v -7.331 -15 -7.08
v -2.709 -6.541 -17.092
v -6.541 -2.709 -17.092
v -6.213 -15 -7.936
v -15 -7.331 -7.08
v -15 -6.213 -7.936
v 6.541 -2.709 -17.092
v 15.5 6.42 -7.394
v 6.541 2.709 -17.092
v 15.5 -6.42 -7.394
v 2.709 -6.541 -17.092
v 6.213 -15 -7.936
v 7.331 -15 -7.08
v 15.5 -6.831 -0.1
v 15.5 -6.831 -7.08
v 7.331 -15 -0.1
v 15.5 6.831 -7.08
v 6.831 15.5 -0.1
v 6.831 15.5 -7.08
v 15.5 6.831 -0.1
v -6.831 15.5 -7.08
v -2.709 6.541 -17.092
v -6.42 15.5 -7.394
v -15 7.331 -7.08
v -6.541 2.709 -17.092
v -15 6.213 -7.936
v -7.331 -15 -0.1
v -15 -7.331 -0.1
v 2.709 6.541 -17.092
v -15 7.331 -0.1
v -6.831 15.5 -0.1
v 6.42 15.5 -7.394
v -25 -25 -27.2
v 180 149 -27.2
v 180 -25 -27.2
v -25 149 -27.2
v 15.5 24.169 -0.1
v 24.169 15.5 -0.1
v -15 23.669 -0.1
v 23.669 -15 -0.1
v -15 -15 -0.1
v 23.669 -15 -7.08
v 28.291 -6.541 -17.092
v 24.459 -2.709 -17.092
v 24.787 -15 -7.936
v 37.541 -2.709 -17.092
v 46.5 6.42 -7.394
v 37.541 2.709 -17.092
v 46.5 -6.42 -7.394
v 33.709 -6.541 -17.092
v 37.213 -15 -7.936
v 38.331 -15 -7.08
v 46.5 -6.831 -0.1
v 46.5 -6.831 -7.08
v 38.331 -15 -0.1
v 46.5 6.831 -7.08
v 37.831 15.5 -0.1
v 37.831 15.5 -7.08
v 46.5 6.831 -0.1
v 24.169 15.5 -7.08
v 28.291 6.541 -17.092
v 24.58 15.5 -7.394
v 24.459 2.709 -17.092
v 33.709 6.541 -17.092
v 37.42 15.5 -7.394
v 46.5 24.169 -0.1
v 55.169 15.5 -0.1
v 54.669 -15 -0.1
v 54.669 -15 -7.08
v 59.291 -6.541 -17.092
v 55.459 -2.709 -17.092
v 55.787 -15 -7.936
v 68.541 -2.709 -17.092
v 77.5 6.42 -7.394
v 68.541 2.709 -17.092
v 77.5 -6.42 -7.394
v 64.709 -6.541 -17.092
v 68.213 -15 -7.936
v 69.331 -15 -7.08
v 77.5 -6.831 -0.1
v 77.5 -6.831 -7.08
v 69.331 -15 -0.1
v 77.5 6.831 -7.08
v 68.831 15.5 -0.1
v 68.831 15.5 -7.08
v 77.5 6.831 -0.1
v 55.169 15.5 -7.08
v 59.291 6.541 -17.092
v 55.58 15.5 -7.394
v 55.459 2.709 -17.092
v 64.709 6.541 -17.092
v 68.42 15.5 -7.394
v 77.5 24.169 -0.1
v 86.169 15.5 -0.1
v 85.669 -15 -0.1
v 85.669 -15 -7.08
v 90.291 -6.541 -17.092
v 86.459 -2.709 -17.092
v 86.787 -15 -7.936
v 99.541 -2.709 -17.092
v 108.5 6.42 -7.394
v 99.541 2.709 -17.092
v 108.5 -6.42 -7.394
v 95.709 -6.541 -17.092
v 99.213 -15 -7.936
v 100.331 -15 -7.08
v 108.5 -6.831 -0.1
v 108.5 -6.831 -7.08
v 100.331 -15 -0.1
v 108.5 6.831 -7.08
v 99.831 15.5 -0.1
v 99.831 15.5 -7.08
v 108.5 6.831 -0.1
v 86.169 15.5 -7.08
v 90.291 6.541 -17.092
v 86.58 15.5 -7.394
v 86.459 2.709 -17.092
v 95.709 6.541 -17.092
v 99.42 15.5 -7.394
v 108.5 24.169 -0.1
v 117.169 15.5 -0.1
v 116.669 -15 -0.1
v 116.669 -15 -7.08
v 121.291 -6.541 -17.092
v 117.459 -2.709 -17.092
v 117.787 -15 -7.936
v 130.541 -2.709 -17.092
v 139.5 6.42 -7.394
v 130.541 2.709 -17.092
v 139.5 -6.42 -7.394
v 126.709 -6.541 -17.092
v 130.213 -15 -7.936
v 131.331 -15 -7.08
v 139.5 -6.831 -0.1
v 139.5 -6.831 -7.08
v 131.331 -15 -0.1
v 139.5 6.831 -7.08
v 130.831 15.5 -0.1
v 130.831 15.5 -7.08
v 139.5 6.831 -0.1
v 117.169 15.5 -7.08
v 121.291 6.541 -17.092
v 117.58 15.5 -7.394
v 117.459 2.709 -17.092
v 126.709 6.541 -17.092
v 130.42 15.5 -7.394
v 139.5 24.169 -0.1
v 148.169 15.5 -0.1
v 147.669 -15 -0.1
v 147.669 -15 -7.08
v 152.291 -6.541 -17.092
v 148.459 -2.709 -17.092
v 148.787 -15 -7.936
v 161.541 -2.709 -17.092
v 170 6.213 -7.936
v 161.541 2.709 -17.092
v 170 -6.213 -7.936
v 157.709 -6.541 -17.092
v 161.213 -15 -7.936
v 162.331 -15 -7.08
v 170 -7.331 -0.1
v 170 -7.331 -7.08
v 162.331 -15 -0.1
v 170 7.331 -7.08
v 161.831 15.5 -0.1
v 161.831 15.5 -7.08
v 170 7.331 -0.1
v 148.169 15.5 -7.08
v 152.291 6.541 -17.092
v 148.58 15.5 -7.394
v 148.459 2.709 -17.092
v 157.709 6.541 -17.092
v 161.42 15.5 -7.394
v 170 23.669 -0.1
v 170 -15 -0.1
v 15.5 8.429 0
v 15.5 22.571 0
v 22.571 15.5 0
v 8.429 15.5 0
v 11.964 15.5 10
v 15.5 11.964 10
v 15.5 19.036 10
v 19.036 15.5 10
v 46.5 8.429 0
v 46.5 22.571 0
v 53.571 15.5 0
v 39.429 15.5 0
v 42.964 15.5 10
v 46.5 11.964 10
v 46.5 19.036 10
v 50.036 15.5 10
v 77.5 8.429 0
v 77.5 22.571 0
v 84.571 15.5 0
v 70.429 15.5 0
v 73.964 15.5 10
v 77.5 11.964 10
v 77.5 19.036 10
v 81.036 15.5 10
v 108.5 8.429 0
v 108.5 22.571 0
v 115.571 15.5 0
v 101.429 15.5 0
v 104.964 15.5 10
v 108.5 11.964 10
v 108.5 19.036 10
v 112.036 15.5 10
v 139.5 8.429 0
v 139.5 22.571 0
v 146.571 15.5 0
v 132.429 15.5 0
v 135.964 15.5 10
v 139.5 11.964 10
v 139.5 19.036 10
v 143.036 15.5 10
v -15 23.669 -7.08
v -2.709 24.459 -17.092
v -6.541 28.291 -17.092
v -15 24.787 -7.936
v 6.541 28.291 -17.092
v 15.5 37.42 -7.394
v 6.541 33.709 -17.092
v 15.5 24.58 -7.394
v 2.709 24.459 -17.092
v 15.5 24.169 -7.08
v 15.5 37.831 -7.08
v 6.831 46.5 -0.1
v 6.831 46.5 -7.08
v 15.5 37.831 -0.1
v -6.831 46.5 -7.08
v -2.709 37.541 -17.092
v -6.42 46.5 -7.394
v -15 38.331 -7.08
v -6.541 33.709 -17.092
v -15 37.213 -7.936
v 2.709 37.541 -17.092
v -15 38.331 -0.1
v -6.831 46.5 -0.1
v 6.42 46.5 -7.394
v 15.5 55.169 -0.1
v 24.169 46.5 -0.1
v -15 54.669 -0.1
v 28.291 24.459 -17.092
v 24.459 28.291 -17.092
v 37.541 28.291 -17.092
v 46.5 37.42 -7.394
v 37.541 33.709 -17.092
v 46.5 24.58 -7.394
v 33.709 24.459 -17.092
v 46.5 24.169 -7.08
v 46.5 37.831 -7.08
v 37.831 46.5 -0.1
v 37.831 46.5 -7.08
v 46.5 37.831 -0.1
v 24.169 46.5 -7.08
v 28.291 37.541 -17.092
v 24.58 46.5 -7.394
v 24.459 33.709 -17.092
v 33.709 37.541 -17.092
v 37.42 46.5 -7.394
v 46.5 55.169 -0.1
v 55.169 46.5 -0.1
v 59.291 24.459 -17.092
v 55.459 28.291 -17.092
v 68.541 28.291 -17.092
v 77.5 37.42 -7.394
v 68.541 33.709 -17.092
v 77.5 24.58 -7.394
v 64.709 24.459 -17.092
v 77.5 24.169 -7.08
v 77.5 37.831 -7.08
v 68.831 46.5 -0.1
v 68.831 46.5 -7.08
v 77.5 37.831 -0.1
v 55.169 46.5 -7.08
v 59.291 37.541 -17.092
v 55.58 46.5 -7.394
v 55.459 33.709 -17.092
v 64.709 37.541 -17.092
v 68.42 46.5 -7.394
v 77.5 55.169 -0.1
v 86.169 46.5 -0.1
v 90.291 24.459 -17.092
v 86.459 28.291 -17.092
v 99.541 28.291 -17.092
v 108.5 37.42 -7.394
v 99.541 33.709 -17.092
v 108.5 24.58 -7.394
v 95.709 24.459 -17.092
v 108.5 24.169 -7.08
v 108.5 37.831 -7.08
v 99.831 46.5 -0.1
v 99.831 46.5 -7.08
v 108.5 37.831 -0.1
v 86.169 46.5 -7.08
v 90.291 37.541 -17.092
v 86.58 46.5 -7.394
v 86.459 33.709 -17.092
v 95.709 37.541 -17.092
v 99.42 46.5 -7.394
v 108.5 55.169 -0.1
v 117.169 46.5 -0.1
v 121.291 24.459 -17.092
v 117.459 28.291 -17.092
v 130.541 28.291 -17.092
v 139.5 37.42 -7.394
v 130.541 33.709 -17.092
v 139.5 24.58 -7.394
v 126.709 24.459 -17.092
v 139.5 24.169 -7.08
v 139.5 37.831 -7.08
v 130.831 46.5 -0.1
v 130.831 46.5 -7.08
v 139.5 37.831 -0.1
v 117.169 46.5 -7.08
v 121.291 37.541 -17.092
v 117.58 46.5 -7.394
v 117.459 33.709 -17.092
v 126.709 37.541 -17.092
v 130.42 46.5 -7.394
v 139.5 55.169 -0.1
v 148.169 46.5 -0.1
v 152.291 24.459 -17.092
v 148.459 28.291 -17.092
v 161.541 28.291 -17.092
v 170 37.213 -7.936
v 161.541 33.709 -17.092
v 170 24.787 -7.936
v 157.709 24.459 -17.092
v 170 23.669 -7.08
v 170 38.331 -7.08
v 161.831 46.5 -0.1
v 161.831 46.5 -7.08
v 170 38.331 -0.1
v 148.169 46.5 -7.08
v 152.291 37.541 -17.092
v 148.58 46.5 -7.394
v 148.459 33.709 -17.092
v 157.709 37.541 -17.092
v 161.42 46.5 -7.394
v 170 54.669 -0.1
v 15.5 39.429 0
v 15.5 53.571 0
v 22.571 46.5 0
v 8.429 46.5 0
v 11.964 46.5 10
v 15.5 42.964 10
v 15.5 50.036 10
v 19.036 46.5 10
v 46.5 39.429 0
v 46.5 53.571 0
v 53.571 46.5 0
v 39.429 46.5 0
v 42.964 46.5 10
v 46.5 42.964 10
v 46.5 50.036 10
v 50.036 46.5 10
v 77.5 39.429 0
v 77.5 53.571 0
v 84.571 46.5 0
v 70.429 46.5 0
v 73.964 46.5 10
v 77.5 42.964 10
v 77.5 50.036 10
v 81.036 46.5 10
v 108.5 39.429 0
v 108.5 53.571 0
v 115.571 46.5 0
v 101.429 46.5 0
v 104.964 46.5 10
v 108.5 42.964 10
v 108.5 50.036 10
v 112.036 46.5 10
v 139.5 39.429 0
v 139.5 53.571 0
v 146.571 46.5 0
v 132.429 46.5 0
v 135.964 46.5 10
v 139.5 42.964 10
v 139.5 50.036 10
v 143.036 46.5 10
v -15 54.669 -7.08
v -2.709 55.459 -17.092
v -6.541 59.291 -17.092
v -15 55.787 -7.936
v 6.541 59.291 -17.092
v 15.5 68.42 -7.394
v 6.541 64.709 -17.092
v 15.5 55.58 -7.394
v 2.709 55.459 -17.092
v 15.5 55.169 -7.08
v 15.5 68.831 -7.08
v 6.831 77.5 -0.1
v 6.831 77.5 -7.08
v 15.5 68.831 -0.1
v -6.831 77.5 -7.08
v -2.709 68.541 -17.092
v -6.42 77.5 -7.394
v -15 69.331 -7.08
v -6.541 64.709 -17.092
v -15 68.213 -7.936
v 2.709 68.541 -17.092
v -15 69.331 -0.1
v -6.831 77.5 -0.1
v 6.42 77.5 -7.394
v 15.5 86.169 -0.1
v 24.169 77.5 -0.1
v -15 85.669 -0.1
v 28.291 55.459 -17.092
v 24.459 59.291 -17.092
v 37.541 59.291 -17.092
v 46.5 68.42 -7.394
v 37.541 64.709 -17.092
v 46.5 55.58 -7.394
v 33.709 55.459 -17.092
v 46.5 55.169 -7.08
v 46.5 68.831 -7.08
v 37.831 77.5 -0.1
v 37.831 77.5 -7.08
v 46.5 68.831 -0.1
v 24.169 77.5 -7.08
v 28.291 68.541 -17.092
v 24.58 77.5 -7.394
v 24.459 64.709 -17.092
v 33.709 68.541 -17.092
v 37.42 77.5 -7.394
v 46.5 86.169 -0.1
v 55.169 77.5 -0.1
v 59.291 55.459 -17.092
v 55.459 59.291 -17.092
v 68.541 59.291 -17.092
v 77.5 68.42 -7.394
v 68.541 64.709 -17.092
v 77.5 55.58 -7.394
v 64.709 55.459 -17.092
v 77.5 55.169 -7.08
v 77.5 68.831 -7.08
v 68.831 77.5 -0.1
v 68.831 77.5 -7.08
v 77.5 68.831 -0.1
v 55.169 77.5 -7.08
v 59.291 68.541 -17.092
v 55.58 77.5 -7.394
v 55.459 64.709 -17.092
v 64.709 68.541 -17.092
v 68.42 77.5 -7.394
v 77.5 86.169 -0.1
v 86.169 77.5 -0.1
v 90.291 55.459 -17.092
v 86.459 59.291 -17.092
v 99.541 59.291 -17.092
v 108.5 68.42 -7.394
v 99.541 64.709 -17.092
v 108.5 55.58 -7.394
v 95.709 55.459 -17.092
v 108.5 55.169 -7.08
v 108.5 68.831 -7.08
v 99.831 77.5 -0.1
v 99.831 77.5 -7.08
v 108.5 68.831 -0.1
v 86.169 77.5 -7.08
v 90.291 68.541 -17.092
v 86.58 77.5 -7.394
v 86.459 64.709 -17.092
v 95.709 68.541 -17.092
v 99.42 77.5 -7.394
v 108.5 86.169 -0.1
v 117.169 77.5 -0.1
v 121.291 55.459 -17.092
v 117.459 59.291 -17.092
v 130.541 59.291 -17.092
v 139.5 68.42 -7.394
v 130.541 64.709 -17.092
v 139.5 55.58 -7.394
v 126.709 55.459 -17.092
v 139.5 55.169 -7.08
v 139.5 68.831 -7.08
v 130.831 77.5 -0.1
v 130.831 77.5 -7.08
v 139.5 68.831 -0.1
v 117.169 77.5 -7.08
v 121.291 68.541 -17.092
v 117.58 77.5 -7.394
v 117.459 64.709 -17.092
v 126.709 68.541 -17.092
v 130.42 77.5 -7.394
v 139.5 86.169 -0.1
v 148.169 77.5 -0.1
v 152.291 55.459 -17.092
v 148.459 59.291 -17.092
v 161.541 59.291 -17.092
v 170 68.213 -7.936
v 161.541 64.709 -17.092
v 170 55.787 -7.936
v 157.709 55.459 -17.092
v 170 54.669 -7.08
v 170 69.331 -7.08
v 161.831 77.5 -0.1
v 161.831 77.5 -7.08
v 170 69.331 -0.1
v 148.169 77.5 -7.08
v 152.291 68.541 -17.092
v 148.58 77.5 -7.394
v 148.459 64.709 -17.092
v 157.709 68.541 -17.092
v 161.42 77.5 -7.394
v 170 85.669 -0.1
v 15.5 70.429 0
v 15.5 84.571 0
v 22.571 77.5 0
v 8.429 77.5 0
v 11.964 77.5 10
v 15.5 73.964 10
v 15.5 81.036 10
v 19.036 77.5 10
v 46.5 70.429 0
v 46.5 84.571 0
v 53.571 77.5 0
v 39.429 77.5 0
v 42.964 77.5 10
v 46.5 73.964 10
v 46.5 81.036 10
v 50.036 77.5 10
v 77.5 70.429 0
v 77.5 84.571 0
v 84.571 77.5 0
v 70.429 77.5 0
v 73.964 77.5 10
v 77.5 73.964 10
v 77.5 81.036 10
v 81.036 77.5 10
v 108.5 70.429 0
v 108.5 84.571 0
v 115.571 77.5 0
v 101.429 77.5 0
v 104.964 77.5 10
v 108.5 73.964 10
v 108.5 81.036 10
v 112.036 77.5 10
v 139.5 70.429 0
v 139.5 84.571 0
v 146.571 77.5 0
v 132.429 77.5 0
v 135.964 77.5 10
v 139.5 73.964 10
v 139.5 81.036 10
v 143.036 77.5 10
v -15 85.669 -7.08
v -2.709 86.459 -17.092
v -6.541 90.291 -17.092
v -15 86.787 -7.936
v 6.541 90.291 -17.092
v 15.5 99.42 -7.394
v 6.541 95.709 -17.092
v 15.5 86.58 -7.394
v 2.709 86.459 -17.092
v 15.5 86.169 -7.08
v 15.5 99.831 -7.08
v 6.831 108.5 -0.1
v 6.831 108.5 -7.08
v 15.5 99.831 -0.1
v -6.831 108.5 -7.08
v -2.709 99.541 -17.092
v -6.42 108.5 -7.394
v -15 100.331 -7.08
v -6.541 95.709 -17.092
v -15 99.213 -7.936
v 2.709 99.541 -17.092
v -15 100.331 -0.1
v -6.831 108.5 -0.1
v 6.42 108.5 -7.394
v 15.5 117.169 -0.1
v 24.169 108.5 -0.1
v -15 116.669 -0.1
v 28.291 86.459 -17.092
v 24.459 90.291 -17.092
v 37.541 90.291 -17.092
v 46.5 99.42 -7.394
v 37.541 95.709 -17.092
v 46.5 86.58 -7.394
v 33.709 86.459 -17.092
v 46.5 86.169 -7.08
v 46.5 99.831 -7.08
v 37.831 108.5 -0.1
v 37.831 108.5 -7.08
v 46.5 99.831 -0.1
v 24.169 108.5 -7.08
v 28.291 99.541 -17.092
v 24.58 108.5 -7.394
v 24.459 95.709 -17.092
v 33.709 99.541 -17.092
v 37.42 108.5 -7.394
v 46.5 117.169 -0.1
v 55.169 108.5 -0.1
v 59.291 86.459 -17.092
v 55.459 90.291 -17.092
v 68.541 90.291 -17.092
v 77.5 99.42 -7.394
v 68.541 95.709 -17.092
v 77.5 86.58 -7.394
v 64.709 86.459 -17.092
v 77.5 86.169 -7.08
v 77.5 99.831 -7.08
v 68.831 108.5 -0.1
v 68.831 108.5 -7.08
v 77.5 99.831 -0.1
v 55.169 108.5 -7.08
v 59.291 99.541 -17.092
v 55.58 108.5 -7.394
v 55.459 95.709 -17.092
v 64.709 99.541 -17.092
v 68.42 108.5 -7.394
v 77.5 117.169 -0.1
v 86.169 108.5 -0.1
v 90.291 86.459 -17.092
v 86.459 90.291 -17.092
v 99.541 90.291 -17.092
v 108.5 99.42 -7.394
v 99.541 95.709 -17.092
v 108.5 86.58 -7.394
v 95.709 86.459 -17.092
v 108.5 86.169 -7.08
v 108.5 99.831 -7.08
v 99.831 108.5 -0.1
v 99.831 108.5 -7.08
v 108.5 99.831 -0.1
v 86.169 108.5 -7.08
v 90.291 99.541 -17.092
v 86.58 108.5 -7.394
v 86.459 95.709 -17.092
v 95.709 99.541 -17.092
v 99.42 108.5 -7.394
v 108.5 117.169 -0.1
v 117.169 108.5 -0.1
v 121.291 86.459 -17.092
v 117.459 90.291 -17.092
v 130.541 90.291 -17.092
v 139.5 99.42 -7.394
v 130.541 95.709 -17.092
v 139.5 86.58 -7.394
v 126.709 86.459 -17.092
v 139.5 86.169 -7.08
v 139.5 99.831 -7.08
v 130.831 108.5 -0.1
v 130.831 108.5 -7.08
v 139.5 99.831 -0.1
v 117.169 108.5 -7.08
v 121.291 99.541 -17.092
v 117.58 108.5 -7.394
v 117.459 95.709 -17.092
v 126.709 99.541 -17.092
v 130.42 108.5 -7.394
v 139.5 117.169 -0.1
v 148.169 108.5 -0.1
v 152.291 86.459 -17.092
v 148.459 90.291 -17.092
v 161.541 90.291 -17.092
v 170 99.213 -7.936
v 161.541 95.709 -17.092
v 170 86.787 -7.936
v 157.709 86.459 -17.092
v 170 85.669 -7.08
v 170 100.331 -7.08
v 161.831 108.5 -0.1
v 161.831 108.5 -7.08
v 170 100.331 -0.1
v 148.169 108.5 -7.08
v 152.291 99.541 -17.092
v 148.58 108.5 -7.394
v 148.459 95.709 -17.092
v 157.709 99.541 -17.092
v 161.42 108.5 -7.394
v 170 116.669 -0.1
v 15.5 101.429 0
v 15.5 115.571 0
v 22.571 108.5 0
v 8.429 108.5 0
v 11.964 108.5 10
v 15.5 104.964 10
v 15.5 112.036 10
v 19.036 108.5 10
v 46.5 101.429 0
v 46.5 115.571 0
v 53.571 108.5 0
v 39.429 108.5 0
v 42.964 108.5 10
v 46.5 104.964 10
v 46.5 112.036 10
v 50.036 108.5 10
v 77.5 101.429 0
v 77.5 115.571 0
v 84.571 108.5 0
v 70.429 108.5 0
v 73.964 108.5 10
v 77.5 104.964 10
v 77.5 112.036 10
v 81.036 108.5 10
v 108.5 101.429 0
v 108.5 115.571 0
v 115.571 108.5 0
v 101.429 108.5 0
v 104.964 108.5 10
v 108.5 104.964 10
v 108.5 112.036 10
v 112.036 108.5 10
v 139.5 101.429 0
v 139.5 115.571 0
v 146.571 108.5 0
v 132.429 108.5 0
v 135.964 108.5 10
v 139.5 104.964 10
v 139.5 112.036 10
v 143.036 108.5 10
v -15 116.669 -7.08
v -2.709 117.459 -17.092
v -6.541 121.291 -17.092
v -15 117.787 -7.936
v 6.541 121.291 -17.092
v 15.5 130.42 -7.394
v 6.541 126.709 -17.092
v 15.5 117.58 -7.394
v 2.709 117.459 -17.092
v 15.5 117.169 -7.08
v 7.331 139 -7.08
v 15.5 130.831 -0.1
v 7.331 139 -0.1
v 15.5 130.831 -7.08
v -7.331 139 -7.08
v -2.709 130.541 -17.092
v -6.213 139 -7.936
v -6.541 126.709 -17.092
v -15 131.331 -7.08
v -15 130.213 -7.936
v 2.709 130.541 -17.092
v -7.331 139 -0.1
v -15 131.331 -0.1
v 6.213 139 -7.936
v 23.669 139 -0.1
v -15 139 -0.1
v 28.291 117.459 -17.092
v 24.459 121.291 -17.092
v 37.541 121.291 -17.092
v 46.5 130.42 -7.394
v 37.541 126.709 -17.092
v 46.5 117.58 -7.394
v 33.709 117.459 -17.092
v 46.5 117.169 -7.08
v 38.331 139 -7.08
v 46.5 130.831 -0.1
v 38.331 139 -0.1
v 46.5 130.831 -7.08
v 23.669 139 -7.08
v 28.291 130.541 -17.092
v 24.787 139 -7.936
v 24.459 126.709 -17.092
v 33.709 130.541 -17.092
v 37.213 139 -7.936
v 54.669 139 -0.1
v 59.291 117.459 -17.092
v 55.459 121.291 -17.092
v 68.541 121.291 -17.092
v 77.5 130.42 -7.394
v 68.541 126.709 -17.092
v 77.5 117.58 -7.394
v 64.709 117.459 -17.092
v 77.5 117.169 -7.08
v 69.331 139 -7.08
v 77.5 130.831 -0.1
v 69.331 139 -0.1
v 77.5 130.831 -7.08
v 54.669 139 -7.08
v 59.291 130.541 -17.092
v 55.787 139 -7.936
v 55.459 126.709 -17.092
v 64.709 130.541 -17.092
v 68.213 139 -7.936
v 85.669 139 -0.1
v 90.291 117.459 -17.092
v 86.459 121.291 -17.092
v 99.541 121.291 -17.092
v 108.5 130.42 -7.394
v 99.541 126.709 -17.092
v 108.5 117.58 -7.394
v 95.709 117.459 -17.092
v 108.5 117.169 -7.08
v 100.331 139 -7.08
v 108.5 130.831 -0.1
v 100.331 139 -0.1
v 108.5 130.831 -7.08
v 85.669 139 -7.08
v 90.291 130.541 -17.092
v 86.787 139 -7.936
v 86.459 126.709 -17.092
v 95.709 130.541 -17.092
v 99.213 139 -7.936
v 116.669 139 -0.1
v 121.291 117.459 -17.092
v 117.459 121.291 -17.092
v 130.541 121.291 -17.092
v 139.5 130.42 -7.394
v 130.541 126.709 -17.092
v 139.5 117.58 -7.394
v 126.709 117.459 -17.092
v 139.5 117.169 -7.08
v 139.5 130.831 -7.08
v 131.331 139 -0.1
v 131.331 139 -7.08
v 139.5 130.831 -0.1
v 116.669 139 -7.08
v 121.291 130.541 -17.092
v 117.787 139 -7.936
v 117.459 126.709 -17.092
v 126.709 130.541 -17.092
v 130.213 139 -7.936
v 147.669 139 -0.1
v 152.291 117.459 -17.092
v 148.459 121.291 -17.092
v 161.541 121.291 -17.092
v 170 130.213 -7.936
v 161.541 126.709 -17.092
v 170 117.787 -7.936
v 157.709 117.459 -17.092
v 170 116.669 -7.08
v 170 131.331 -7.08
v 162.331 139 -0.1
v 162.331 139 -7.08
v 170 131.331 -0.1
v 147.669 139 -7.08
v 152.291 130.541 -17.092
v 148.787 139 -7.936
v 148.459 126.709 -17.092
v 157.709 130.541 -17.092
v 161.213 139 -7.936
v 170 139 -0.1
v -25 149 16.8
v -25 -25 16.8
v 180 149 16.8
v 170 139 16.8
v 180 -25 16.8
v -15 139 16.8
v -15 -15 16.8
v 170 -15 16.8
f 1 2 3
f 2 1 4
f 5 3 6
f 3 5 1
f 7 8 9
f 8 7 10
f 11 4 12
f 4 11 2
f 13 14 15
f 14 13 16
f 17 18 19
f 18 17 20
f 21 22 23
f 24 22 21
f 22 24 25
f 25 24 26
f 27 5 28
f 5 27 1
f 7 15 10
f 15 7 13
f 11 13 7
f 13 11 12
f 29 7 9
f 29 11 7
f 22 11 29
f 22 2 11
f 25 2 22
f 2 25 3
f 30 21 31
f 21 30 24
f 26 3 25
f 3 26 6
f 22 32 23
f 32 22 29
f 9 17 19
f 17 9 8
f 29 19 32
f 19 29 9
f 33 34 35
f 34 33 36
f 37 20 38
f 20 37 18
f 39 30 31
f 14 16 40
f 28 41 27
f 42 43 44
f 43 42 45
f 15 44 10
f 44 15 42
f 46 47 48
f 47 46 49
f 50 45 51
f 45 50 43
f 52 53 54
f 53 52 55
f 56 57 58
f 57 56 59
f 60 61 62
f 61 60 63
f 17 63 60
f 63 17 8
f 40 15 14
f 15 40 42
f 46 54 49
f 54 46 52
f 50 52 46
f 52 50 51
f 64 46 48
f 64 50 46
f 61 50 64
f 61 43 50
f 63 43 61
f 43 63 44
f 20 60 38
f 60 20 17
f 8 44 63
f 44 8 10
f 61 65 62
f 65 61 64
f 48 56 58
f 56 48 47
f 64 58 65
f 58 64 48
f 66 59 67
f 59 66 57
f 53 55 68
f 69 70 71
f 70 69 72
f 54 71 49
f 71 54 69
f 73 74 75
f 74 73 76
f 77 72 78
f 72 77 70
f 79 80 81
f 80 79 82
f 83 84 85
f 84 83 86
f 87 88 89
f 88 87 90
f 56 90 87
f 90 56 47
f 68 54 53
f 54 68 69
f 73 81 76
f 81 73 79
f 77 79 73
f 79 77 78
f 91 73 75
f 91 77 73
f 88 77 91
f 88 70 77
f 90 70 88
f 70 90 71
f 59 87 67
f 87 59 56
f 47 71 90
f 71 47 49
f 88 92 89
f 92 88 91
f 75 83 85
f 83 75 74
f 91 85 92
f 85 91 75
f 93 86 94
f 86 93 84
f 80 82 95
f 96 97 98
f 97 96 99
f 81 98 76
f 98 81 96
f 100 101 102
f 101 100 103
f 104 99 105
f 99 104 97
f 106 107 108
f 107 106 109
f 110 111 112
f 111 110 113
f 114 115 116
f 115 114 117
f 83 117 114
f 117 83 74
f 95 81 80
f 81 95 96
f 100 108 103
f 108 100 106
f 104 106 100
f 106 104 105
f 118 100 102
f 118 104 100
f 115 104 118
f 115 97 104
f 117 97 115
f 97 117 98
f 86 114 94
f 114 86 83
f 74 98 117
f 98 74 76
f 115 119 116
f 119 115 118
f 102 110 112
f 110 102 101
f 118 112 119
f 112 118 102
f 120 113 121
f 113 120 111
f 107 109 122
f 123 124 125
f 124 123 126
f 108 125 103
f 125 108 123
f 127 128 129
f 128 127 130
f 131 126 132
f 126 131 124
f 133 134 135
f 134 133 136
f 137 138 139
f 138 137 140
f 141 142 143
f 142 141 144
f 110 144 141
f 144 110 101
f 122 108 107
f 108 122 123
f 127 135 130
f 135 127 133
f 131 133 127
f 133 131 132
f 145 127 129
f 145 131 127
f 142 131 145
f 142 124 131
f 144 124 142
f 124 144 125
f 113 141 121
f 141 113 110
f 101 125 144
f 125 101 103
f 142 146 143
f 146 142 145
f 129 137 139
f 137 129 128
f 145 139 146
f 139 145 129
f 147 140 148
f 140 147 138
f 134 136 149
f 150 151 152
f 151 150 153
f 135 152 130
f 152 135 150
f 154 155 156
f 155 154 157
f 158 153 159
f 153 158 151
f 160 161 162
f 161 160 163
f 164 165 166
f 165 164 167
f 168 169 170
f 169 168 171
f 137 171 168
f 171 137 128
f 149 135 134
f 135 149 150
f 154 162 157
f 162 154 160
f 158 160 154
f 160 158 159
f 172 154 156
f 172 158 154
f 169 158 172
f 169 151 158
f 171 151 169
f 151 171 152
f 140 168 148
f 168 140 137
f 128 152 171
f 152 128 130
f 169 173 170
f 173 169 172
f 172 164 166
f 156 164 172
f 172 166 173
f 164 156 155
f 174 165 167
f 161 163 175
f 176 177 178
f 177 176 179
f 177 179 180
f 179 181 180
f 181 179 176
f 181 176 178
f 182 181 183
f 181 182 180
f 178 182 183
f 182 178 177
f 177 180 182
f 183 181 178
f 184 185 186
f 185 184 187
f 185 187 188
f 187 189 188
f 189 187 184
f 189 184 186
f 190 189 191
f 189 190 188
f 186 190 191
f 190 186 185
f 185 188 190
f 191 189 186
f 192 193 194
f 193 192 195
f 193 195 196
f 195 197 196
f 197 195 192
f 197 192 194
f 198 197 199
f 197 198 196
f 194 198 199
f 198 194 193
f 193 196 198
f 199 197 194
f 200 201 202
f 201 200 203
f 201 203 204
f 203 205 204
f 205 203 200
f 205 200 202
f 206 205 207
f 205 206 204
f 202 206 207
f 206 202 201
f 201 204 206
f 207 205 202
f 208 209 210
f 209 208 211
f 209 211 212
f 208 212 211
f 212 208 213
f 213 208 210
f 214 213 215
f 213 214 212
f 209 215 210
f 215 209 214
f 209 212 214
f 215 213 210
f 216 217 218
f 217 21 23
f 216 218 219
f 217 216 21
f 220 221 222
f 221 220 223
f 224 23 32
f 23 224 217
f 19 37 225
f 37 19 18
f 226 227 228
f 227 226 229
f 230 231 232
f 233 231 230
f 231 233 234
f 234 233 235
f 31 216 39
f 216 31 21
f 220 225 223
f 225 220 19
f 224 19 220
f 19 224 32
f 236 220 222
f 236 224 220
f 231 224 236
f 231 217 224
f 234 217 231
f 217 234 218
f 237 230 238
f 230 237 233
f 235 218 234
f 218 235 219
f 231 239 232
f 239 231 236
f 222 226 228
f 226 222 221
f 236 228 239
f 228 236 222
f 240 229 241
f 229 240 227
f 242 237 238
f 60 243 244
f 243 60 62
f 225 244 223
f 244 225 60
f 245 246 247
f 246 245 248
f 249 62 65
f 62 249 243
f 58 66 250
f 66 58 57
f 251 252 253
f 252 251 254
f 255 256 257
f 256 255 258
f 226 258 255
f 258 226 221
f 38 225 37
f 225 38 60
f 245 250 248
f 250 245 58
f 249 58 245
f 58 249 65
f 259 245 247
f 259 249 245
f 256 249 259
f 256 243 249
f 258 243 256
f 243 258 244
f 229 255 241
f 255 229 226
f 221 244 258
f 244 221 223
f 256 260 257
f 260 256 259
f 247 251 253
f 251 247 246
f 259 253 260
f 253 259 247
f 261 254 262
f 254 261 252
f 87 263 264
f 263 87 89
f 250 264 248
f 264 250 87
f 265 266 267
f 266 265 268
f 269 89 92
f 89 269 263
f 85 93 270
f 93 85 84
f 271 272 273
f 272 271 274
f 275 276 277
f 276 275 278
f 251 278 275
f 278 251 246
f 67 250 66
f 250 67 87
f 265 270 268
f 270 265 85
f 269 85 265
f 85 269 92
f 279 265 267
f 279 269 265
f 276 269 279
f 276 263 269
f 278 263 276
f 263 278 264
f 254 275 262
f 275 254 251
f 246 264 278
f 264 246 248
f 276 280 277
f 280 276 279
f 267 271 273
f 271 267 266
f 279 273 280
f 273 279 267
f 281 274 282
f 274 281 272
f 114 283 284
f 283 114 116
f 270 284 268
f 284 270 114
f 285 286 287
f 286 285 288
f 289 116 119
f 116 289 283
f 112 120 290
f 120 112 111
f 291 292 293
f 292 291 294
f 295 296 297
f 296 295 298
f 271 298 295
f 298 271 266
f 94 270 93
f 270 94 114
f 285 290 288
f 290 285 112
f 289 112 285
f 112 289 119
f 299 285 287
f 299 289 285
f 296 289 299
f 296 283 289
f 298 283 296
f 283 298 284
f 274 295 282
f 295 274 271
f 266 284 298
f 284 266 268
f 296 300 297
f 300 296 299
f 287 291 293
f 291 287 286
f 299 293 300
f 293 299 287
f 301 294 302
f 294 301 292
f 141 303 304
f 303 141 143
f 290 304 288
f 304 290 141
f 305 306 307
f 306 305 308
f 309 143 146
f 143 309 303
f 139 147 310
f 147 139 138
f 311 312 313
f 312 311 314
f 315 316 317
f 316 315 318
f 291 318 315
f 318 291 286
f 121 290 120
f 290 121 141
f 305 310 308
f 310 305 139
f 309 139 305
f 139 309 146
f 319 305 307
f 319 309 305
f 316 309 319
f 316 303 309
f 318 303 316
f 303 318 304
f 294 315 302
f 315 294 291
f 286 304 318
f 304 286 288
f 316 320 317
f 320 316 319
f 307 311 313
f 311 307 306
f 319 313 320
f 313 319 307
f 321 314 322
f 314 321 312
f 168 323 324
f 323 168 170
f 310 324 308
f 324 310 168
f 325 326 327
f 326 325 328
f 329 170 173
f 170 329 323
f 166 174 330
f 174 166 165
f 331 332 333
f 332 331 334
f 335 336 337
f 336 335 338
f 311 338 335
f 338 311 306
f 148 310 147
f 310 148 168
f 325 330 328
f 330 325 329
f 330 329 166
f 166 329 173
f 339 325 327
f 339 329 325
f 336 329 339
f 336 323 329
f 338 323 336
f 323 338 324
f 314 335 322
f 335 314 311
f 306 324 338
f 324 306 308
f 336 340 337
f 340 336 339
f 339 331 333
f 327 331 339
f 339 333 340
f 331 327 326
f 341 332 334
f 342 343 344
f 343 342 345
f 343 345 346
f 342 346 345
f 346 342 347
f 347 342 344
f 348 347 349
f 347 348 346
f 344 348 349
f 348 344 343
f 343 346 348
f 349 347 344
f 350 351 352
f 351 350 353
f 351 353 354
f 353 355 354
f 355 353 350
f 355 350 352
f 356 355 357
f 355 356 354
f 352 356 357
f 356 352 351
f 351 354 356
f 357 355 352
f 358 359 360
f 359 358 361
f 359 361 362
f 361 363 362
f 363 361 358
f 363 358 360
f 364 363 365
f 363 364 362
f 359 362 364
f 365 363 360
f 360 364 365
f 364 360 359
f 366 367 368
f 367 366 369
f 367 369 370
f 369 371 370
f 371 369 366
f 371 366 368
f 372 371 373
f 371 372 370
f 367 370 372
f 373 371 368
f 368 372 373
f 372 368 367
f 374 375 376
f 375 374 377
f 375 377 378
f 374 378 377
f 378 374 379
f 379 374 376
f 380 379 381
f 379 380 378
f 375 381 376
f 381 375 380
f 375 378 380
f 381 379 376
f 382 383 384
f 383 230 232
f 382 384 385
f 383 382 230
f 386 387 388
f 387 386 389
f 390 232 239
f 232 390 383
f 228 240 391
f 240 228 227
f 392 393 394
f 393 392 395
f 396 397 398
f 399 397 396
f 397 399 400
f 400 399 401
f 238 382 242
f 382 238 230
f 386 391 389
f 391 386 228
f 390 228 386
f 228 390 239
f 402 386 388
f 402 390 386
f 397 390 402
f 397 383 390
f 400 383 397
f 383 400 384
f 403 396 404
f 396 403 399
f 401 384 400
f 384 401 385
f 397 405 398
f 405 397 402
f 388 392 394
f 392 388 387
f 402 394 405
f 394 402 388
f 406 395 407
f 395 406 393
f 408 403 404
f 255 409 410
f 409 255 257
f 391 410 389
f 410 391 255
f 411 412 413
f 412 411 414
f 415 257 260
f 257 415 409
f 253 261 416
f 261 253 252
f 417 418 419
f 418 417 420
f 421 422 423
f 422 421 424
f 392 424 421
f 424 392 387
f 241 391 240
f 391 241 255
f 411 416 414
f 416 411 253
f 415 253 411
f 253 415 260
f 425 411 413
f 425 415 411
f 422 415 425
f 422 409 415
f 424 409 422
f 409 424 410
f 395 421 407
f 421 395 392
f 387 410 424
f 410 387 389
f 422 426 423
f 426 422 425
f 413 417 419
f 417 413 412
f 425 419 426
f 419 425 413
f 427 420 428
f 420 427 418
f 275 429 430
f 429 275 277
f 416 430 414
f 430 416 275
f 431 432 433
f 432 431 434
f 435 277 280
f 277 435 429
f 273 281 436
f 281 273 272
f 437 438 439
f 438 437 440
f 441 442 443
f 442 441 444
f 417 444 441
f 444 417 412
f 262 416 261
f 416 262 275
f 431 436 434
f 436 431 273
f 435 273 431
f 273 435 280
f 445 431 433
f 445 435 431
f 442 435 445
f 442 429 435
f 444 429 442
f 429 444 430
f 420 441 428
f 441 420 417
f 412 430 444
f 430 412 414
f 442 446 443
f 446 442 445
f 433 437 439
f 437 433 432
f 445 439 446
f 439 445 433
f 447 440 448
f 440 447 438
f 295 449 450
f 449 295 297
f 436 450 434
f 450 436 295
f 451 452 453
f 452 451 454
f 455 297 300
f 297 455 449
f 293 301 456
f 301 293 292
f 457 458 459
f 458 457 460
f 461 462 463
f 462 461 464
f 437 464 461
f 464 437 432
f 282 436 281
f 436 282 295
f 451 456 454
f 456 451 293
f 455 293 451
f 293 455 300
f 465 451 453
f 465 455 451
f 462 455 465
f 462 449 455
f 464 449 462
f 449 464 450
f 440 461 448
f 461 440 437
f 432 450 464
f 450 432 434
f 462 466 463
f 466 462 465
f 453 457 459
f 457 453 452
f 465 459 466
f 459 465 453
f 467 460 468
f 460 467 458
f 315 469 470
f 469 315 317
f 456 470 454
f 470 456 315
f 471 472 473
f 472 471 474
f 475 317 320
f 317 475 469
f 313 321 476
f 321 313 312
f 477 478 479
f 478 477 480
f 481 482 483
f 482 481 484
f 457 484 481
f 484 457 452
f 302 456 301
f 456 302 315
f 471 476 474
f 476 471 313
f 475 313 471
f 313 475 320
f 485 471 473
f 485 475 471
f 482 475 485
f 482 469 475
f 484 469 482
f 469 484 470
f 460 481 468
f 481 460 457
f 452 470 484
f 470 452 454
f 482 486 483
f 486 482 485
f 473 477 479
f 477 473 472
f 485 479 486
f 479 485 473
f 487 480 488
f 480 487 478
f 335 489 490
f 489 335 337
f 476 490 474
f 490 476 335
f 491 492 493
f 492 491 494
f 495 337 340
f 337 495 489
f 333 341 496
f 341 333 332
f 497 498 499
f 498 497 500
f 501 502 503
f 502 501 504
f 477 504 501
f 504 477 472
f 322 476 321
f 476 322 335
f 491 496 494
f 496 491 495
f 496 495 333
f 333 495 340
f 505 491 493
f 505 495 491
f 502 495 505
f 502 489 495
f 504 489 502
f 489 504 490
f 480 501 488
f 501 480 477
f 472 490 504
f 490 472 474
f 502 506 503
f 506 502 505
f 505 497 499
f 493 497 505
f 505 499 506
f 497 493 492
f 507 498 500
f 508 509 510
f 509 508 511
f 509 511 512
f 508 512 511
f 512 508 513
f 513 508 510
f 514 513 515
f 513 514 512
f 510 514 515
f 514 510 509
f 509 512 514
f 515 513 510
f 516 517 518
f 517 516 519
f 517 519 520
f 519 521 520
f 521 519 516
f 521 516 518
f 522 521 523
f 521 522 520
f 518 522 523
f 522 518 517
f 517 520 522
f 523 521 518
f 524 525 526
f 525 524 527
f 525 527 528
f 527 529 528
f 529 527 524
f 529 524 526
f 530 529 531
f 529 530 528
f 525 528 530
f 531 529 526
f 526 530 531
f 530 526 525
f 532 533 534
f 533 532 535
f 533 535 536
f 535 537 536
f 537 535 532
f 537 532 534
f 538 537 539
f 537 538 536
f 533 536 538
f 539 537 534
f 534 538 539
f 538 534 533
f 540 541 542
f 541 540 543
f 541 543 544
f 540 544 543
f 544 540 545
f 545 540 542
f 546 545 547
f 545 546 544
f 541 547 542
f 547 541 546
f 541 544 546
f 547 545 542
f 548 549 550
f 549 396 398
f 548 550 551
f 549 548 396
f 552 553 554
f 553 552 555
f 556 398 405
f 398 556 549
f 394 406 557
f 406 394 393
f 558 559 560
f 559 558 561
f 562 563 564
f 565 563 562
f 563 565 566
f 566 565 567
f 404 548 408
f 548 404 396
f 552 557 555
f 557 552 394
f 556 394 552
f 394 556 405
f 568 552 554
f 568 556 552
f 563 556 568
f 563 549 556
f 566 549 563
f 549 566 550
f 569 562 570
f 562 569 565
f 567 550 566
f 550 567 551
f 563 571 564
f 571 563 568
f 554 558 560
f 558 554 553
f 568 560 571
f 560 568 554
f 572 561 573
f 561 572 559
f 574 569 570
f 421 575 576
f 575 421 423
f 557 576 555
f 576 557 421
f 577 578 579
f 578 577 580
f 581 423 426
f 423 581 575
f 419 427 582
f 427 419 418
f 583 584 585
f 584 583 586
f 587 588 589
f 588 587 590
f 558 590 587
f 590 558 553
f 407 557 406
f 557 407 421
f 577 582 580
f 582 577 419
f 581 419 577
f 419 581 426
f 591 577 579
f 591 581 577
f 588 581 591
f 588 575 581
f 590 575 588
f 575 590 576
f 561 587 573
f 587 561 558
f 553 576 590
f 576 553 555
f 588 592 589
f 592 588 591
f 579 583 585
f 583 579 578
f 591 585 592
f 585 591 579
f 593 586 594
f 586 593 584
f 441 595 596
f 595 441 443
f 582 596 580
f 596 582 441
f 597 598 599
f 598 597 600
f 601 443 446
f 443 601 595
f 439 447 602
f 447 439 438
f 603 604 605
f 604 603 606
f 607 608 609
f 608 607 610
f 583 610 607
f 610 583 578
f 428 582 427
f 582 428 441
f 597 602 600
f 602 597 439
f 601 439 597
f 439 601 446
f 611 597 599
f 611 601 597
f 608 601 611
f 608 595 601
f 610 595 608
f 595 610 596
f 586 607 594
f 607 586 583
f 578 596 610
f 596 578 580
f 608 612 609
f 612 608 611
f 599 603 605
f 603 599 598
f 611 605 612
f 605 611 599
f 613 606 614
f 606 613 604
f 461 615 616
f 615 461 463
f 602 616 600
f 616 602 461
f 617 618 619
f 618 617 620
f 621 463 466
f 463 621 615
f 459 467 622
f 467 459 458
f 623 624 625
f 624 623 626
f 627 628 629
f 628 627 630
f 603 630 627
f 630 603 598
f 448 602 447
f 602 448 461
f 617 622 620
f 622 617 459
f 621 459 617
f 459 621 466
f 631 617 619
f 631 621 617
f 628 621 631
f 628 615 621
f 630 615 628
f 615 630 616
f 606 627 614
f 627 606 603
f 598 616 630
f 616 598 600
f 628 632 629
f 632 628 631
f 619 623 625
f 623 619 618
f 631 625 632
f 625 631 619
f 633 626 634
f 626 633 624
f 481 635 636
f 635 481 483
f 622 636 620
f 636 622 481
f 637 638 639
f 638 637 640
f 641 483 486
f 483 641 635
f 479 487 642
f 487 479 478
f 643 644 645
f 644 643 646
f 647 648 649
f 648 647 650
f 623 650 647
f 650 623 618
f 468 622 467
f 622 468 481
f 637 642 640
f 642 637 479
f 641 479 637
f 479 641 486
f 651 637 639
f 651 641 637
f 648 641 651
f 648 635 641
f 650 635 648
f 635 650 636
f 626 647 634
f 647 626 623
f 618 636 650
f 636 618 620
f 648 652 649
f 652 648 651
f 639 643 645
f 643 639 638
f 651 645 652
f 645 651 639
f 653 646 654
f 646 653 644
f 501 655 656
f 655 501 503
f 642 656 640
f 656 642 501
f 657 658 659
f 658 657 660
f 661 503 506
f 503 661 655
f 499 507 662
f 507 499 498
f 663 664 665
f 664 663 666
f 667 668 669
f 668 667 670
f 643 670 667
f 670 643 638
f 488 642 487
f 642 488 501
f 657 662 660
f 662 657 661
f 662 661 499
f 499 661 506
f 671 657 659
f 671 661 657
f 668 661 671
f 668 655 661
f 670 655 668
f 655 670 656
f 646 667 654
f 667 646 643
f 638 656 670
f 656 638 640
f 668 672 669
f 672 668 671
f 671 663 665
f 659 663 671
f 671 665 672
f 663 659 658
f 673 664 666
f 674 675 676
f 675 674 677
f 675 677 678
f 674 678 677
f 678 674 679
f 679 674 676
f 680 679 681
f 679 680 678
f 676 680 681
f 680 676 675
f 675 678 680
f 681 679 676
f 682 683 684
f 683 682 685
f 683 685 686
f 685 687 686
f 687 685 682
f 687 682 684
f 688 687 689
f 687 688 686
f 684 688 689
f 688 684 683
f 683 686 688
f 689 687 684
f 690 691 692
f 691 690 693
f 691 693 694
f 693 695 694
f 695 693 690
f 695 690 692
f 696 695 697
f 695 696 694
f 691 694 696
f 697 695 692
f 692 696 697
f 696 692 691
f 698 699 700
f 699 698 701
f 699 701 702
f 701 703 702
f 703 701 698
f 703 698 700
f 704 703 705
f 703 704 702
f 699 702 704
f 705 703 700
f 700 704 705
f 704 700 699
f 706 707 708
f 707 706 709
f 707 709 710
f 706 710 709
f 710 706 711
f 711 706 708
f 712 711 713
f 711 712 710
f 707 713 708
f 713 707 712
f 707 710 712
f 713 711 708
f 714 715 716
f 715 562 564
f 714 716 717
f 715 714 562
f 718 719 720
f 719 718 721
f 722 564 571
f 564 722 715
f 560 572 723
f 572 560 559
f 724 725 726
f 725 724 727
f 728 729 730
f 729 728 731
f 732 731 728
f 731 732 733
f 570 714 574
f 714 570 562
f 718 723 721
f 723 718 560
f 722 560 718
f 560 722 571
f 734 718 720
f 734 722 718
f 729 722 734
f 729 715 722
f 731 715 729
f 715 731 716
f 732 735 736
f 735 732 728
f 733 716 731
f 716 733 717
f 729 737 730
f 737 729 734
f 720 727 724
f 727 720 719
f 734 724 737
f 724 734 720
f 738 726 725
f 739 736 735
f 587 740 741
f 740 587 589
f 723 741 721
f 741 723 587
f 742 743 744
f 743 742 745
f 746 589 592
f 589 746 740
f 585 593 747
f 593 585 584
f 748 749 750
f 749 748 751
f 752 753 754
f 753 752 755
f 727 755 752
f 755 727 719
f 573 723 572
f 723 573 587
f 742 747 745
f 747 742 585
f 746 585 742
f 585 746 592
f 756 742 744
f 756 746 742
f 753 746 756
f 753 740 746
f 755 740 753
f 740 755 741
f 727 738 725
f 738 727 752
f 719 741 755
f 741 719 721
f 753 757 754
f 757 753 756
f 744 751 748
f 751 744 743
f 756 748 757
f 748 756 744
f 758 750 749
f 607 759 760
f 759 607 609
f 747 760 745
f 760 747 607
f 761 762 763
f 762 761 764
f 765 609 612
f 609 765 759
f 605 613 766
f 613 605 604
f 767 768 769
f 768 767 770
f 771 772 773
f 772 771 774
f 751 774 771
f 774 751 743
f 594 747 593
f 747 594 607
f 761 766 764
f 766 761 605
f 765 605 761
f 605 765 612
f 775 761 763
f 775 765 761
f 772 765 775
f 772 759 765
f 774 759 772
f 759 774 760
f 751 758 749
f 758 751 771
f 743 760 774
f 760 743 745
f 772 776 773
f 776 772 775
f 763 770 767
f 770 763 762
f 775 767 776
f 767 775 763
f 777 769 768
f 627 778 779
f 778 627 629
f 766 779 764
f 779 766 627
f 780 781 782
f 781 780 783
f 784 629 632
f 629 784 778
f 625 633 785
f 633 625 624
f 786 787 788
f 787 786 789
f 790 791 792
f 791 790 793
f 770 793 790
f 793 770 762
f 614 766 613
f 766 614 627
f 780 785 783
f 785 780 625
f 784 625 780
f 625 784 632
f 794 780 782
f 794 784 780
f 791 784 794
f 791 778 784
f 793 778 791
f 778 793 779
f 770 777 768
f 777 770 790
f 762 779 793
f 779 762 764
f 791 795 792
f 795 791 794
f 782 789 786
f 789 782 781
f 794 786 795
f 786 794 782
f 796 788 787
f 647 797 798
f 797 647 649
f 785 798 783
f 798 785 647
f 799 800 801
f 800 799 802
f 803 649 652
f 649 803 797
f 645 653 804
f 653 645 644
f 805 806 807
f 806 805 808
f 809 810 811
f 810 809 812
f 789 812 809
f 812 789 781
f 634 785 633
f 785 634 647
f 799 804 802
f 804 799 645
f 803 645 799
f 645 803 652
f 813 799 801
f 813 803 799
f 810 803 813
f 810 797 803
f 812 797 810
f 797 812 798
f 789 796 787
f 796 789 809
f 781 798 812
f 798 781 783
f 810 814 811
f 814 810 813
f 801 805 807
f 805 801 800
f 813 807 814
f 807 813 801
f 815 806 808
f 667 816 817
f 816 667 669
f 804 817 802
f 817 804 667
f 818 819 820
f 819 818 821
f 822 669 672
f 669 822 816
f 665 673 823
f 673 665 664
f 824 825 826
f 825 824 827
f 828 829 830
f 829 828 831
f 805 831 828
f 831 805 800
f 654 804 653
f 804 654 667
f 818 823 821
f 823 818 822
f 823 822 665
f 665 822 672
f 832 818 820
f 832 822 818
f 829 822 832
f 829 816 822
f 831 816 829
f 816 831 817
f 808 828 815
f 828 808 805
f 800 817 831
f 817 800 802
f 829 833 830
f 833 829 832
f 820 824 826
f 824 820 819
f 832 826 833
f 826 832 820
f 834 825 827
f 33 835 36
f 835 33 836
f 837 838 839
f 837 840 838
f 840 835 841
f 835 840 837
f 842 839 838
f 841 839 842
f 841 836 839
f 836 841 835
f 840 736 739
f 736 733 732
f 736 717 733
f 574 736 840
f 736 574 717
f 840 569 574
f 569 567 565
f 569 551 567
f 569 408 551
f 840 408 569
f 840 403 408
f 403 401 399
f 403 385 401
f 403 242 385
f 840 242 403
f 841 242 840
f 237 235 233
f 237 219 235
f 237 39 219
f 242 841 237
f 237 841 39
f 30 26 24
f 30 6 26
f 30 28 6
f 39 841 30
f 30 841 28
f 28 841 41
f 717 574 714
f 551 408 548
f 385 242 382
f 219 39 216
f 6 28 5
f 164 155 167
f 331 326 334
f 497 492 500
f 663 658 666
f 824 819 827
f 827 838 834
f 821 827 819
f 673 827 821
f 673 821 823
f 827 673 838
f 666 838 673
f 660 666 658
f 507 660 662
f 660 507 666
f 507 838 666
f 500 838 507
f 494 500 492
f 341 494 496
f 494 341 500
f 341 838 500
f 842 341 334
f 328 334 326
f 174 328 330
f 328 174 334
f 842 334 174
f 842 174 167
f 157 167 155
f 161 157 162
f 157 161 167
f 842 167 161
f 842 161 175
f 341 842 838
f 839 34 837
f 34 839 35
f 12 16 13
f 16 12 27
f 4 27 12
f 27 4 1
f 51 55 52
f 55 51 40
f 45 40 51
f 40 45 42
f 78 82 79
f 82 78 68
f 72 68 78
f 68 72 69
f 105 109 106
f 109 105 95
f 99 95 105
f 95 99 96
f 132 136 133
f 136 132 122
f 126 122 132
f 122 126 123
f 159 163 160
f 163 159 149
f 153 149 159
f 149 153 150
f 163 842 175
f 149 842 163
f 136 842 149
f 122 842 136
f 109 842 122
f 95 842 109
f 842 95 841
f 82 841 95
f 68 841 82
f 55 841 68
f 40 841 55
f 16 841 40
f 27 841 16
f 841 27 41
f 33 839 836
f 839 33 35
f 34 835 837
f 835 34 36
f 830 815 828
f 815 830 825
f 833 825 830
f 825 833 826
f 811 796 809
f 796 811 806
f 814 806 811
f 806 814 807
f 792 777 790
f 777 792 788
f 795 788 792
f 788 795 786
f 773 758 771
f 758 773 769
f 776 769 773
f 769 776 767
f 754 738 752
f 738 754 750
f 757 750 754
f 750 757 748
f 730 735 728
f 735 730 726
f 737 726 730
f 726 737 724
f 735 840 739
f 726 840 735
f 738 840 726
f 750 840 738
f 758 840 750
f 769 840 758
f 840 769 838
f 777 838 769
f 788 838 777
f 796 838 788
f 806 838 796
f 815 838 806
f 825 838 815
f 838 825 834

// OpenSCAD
//egg();
//carton_single();
//carton_six();
//carton();
//stump();
//single_mold_bottom();
bottom_mold();
module egg(){ 
    sphere(17.5,$fn=8);
    }
    
module egg2(){ 
    sphere(18.5,$fn=8);
    }
    
module carton_single(){
    difference(){

    rotate(22.5)egg2();
    rotate(22.5)egg();
    linear_extrude(17.1)square([31.6,31.6],center=true);
    }
}
module carton_single_mold(){
    difference(){

    rotate(22.5)egg2();
    //rotate(22.5)egg();
    linear_extrude(17.1)square([31.6,31.6],center=true);
    }
}
module single_mold_bottom(){
  difference(){

      translate([0,0,-27.2])linear_extrude(27.1)square([31,31],center=true);
          carton_single_mold();
  }
}
module carton_six(){
    carton_single();
    translate([15.5,15.5,0])rotate(45)stump();
    translate([31,0,0])carton_single();
    translate([46.5,15.5,0])rotate(45)stump();
    translate([62,0,0])carton_single();
    translate([77.5,15.5,0])rotate(45)stump();
    translate([93,0,0])carton_single();
    translate([108.5,15.5,0])rotate(45)stump();
    translate([124,0,0])carton_single();
    translate([139.5,15.5,0])rotate(45)stump();
    translate([155,0,0])carton_single();
}
module carton_six_wo(){
    carton_single();
    translate([31,0,0])carton_single();
    translate([62,0,0])carton_single();
    translate([93,0,0])carton_single();
    translate([124,0,0])carton_single();
    translate([155,0,0])carton_single();
}
module carton_mold_six(){
    single_mold_bottom();
    translate([15.5,15.5,0])rotate(45)mold_stump();
    translate([31,0,0])single_mold_bottom();
    translate([46.5,15.5,0])rotate(45)mold_stump();
    translate([62,0,0])single_mold_bottom();
    translate([77.5,15.5,0])rotate(45)mold_stump();
    translate([93,0,0])single_mold_bottom();
    translate([108.5,15.5,0])rotate(45)mold_stump();
    translate([124,0,0])single_mold_bottom();
    translate([139.5,15.5,0])rotate(45)mold_stump();
    translate([155,0,0])single_mold_bottom();
}
module carton_mold_six_wo(){
    single_mold_bottom();
    translate([31,0,0])single_mold_bottom();
    translate([62,0,0])single_mold_bottom();
    translate([93,0,0])single_mold_bottom();
    translate([124,0,0])single_mold_bottom();
    translate([155,0,0])single_mold_bottom();
}
module carton(){
    carton_six();
    translate([0,31,0])carton_six();
    translate([0,62,0])carton_six();
    translate([0,93,0])carton_six();
    translate([0,124,0])carton_six_wo();
}
module stump(){
    difference(){
linear_extrude(14.5,scale=0.5)square([13.5,13.5],center=true);
linear_extrude(6,scale=0.5)square([10,10],center=true);
    }
}
module mold_stump(){
    difference(){
//linear_extrude(14.5,scale=0.5)square([13.5,13.5],center=true);
linear_extrude(10,scale=0.5)square([10,10],center=true);
    }
}
module bottom_mold(){
        carton_mold_six();
    translate([0,31,0])carton_mold_six();
    translate([0,62,0])carton_mold_six();
    translate([0,93,0])carton_mold_six();
    translate([0,124,0])carton_mold_six_wo();
    translate([-25,-16,-27.2])linear_extrude(44)square([10,160]);//side
    translate([170,-16,-27.2])linear_extrude(44)square([10,160]);//side
    translate([-25,-25,-27.2])linear_extrude(44)square([205,10]);//side
    translate([-25,139,-27.2])linear_extrude(44)square([205,10]);//side
}
